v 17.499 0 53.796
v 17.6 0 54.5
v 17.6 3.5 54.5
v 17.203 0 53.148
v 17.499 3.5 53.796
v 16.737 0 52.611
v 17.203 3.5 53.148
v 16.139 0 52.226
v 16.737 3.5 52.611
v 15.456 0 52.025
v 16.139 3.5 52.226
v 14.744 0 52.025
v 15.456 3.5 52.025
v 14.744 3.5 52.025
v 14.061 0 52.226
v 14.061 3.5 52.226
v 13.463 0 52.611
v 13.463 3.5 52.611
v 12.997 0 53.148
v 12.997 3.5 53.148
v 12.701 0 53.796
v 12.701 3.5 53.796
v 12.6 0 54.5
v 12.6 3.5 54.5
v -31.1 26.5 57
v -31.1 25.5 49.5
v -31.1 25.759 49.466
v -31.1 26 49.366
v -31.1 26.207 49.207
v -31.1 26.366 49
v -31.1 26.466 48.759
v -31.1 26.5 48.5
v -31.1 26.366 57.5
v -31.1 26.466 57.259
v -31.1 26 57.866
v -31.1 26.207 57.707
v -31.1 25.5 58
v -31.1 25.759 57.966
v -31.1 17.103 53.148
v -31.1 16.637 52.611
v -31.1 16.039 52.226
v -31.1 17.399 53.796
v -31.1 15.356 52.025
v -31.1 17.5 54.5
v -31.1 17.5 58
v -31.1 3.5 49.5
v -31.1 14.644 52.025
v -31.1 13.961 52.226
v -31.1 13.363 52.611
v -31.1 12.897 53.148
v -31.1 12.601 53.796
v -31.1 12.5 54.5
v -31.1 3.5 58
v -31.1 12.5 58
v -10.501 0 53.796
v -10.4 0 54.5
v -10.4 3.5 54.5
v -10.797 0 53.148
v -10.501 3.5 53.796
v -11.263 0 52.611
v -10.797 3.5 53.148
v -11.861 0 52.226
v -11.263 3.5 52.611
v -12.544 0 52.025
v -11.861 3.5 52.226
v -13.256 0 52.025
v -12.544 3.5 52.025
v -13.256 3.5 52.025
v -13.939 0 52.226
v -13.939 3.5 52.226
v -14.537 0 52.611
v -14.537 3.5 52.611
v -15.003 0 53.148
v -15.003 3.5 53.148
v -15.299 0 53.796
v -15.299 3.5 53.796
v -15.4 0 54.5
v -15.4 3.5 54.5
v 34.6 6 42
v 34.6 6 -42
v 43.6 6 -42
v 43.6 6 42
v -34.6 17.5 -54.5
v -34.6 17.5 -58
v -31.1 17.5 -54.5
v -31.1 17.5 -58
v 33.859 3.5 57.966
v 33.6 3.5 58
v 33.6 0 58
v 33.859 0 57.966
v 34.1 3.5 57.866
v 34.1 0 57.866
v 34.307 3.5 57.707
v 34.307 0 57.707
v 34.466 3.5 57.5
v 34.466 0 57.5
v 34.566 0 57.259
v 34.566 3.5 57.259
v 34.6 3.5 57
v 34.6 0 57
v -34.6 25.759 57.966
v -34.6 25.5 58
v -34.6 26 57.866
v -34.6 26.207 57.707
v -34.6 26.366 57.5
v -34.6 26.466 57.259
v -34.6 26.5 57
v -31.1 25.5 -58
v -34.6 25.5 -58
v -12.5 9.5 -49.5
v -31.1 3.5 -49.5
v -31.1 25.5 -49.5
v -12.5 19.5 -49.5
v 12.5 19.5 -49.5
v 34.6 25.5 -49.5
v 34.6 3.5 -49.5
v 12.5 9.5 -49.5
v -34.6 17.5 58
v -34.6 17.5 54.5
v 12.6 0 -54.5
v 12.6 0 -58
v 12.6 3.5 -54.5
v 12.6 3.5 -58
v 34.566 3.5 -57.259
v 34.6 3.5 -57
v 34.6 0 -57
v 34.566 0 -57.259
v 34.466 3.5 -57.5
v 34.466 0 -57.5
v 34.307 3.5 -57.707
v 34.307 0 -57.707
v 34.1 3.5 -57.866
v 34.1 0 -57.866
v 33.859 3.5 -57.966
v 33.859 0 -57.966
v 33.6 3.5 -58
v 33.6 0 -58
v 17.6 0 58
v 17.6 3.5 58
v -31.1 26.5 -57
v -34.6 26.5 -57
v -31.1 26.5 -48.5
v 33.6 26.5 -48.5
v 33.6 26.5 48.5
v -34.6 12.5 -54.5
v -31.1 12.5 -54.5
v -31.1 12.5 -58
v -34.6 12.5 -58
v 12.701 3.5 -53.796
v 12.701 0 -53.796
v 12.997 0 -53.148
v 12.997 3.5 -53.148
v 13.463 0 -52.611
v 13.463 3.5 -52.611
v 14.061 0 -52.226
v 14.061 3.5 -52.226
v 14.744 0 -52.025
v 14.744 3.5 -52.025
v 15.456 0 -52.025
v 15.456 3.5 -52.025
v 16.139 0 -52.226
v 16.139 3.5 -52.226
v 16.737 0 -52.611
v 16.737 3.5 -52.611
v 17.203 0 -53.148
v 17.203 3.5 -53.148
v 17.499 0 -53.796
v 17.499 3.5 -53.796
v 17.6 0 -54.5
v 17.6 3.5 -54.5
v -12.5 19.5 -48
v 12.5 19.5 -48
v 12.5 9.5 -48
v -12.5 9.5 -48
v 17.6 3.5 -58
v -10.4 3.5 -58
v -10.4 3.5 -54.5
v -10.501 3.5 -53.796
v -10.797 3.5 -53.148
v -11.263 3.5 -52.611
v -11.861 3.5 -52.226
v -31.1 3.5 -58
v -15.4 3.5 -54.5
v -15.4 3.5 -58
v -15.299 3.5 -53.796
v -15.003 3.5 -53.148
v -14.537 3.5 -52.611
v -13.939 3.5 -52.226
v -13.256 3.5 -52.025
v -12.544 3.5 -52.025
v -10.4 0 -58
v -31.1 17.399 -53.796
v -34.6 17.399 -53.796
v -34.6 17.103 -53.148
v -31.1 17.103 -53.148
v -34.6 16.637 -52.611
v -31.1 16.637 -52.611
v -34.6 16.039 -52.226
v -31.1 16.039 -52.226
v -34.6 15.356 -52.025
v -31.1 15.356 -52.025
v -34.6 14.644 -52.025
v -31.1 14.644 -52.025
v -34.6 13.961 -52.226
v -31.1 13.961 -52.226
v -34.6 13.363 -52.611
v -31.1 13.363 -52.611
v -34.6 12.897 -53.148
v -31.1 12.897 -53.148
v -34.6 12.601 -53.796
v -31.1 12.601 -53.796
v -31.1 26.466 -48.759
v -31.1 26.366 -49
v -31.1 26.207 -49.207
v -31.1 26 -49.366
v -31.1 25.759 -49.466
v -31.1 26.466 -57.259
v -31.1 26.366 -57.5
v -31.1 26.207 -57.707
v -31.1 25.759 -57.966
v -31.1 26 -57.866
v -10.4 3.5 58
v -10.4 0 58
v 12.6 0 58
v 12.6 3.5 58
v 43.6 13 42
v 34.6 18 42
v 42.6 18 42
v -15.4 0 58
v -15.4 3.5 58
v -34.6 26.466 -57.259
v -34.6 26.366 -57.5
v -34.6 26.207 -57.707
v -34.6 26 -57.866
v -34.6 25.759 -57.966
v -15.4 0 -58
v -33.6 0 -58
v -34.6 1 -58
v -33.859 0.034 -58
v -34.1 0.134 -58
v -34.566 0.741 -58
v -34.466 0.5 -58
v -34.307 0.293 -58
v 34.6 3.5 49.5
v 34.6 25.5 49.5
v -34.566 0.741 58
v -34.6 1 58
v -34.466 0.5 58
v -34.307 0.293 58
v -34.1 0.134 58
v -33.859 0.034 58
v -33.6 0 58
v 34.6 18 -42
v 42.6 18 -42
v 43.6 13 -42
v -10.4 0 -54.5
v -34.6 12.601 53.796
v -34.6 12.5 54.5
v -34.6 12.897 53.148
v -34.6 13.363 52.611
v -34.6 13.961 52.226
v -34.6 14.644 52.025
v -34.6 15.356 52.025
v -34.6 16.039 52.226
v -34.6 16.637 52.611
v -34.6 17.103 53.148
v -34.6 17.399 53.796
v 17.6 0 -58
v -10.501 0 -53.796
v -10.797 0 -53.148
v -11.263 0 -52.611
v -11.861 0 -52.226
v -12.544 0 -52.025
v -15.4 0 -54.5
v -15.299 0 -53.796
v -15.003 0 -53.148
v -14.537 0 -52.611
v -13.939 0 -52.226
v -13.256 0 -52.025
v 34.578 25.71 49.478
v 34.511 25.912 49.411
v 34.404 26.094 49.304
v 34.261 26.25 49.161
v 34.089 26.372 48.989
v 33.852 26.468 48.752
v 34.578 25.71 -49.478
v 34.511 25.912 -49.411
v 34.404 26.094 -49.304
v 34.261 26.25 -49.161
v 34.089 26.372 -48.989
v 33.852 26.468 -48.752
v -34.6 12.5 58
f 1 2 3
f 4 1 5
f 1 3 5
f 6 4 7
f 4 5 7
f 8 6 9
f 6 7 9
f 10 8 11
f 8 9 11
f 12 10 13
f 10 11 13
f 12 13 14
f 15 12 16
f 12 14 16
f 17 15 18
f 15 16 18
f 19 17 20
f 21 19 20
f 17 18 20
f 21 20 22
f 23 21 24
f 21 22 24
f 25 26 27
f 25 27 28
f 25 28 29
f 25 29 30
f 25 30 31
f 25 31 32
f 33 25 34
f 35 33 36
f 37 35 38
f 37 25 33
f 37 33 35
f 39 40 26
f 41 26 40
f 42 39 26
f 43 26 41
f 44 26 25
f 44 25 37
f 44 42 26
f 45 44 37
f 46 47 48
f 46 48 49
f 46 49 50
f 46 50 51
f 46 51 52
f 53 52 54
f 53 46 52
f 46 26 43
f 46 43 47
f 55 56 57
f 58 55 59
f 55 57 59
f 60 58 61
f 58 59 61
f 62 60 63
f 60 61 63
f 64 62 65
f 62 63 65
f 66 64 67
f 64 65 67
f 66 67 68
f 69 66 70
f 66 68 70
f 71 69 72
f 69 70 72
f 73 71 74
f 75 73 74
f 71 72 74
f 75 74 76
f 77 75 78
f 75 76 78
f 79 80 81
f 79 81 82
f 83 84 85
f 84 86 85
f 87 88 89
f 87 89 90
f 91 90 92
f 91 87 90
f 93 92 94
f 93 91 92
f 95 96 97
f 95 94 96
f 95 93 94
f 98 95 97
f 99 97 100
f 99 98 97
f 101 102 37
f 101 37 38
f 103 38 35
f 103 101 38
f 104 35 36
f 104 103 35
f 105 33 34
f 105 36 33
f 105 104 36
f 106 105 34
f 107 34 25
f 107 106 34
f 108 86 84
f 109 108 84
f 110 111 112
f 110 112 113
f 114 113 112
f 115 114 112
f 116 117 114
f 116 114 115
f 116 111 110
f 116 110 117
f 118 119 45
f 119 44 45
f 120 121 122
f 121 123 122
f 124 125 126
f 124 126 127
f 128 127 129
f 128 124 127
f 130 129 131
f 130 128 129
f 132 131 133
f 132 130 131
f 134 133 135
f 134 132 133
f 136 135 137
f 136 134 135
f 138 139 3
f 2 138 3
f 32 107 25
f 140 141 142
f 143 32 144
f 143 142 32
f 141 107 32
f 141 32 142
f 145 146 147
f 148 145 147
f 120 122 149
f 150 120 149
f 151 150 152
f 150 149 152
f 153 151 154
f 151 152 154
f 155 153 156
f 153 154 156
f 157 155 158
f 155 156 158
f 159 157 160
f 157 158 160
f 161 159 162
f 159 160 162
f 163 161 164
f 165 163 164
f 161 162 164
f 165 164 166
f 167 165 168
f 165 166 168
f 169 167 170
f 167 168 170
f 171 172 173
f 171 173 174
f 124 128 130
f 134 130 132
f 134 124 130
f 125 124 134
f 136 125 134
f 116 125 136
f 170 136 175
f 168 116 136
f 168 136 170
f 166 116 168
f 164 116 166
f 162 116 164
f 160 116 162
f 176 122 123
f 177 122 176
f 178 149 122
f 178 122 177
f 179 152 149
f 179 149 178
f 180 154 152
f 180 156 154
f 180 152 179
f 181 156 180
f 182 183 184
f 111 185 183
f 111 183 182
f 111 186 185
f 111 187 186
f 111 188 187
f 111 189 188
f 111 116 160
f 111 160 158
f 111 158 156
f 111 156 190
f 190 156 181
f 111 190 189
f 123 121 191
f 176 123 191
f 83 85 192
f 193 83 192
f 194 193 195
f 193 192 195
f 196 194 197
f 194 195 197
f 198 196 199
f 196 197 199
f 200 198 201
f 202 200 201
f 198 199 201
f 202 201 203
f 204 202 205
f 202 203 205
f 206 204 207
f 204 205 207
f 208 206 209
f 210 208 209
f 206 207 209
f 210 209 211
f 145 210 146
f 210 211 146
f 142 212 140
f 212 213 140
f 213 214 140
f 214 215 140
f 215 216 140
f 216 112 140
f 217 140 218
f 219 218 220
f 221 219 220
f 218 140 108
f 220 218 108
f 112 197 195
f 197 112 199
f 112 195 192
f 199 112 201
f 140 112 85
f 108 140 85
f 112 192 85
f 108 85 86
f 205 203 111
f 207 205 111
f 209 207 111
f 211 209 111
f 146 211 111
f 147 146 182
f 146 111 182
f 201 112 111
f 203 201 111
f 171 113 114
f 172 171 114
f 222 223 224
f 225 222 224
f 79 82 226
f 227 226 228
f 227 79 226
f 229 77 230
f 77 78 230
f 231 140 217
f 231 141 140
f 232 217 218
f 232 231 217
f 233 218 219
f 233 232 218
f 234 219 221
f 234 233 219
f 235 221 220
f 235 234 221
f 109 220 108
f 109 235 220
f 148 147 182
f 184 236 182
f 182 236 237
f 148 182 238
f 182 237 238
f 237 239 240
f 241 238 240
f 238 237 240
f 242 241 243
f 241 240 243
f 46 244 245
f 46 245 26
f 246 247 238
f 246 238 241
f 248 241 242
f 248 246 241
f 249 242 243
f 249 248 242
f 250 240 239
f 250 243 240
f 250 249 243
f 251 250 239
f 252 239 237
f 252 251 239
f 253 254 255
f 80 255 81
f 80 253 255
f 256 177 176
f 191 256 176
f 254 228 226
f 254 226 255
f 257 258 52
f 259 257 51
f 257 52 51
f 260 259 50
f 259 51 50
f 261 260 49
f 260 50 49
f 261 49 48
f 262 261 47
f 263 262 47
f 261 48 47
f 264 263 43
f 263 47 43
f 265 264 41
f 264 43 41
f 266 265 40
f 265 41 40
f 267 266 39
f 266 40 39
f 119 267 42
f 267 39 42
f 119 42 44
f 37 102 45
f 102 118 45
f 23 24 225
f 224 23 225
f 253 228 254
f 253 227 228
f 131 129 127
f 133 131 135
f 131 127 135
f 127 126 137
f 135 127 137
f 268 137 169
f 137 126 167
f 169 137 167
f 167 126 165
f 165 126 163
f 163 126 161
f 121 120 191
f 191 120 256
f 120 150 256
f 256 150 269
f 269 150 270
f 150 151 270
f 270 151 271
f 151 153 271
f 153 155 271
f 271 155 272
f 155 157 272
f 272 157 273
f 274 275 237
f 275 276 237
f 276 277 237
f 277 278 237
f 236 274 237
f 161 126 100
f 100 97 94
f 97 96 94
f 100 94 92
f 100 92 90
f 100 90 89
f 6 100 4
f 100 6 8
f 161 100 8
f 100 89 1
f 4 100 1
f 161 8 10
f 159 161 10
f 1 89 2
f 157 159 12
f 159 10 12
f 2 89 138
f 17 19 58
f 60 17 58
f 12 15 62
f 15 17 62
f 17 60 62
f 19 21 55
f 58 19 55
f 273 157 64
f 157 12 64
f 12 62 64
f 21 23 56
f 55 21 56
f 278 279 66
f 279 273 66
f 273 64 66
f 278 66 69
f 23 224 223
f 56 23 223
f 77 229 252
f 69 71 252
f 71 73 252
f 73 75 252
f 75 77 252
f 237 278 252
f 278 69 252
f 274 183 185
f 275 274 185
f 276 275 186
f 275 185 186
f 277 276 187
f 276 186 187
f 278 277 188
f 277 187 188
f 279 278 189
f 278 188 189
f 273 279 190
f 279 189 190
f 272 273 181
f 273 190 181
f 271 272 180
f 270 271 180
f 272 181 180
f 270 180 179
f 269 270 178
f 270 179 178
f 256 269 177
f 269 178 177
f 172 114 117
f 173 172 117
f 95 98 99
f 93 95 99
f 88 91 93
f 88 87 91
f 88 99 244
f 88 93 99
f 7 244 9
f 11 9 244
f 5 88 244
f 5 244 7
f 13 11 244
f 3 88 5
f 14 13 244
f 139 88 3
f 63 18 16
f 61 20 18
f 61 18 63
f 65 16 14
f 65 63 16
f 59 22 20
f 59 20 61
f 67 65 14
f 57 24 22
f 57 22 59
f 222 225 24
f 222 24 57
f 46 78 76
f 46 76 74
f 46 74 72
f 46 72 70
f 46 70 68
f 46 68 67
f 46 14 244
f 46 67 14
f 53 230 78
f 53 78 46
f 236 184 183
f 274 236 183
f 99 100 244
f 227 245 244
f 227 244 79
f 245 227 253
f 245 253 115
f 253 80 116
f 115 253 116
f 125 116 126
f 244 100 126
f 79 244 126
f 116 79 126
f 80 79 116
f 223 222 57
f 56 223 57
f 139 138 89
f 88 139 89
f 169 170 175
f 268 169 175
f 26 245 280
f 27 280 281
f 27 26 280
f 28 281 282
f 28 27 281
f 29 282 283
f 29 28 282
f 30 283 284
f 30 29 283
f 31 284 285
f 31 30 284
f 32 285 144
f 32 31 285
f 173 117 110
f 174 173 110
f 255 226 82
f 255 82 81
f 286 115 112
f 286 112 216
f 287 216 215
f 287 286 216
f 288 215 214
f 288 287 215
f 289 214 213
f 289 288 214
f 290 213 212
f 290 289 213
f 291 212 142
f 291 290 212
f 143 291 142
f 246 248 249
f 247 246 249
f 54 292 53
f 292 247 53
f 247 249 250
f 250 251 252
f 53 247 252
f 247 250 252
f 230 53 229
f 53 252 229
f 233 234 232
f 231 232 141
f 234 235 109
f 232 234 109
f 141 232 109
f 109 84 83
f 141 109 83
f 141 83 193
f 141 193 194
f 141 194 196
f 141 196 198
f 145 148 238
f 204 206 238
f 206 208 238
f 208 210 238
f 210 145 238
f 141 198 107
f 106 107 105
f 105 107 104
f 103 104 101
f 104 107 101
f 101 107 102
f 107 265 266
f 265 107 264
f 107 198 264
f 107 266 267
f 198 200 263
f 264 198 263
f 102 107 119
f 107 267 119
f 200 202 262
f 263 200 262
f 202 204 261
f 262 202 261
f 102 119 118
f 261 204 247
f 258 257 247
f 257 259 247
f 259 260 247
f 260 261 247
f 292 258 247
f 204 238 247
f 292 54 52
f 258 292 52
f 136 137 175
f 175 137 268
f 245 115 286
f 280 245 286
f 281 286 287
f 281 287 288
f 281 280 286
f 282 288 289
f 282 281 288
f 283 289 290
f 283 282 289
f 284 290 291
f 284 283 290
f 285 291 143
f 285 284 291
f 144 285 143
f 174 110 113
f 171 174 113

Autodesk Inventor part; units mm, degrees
ref_plane "YZ Plane" through (0, 0, 0) normal (1, 0, 0) x (0, 1, 0)
ref_plane "XZ Plane" through (0, 0, 0) normal (0, 1, 0) x (-1, 0, 0)
ref_plane "XY Plane" through (0, 0, 0) normal (0, 0, 1) x (1, 0, 0)
sketch "Sketch1" plane through (0, 0, 0) normal (0, 1, 0) x (-1, 0, 0)
  line L0 (34.6, 58) -> (-34.6, 58)
  line L1 (-34.6, 58) -> (-34.6, -58)
  line L2 (-34.6, -58) -> (34.6, -58)
  line L3 (34.6, -58) -> (34.6, 58)
  line L4 (34.6, 58) -> (-34.6, -58) construction
  line L5 (-34.6, 58) -> (34.6, -58) construction
  point P0 (0, 0)
  dimension "d0" = 69.2
  dimension "d1" = 116
extrude "Extrusion1" add sketch "Sketch1" along normal blind 3.5
sketch "Sketch2" plane through (0, 3.5, 0) normal (0, 1, 0) x (1, 0, 0)
  line L0 (-34.6, 49.5) -> (34.6, 49.5)
  line L1 (34.6, 49.5) -> (34.6, -49.5)
  line L2 (34.6, -49.5) -> (-34.6, -49.5)
  line L3 (-34.6, -49.5) -> (-34.6, 49.5)
  line L4 (-34.6, 49.5) -> (34.6, -49.5) construction
  line L5 (34.6, 49.5) -> (-34.6, -49.5) construction
  line L6 (-34.6, 49.5) -> (-31.1, 49.5)
  line L7 (-31.1, 49.5) -> (-31.1, 58)
  line L8 (-31.1, 58) -> (-34.6, 58)
  line L9 (-34.6, 58) -> (-34.6, 49.5)
  line L10 (-34.6, -49.5) -> (-31.1, -49.5)
  line L11 (-31.1, -49.5) -> (-31.1, -58)
  line L12 (-31.1, -58) -> (-34.6, -58)
  line L13 (-34.6, -58) -> (-34.6, -49.5)
  point P0 (0, 0)
  dimension "d4" = 69.2
  dimension "d5" = 99
  dimension "d6" = 3.5
  dimension "d7" = 8.5
  dimension "d8" = 3.5
  dimension "d9" = 8.5
extrude "Extrusion2" add sketch "Sketch2" along normal blind 23
sketch "Sketch3" plane through (34.6, 0, 58) normal (1, 0, 0) x (0, 0, -1)
  line L0 (58, 0) -> (58, 55) construction
  line L1 (58, 0) -> (113, 0) construction
  line L2 (16, 18) -> (100, 18)
  line L3 (100, 18) -> (100, 6)
  line L4 (100, 6) -> (16, 6)
  line L5 (16, 6) -> (16, 18)
  line L6 (16, 18) -> (100, 6) construction
  line L7 (100, 18) -> (16, 6) construction
  point P0 (58, 12)
  dimension "d12" = 55
  dimension "d13" = 90
  dimension "d14" = 84
  dimension "d15" = 12
  dimension "d16" = 12
extrude "Extrusion3" add sketch "Sketch3" along normal blind 9
chamfer "Chamfer1" distance 5 distance2 1 1 edges at (43.6, 18, 0) measured on face at (43.6, 14, 14)
sketch "Sketch5" plane through (-31.1, 3.5, -49.5) normal (1, 0, 0) x (0, 0, -1)
  line L0 (5, 11.5) -> (10, 11.5) construction
  line L1 (5, 9) -> (10, 9)
  line L2 (10, 14) -> (5, 14)
  arc A0 (5, 14) -> (5, 9) centre (5, 11.5) ccw
  arc A1 (10, 9) -> (10, 14) centre (10, 11.5) ccw
  line L3 (5, 11.5) -> (10, 11.5) construction
  line L4 (-107.5, -3.5) -> (8.5, -3.5) projected
  line L5 (8.5, 0) -> (8.5, 23) projected
  point P0 (-49.5, -3.5)
  point P1 (7.5, 11.5)
  point P2 (8.5, 9)
  point P3 (8.5, 14)
  dimension "d38" = 5
  dimension "d39" = 0
  dimension "d40" = 5
  dimension "d41" = 15
  dimension "d42" = 3.5
extrude "Extrusion5" cut sketch "Sketch5" against normal blind 9 contours A0 L2 L5 L1
sketch "Sketch4" plane through (0, 3.5, 0) normal (0, 1, 0) x (1, 0, 0)
  circle A0 centre (15.1, 54.5) radius 2.5
  circle A1 centre (-12.9, 54.5) radius 2.5
  line L0 (34.6, 49.5) -> (34.6, 58) projected
  line L1 (34.6, 58) -> (-31.1, 58) projected
  line L2 (15.1, 54.5) -> (15.1, 58) construction
  line L3 (34.6, 58) -> (-34.6, 58) projected
  line L4 (17.6, 54.5) -> (17.6, 58)
  line L5 (12.6, 58) -> (12.6, 54.5)
  arc A2 (12.6, 54.5) -> (17.6, 54.5) centre (15.1, 54.5) ccw
  arc A3 (17.6, 58) -> (12.6, 58) centre (15.1, 58) ccw
  line L6 (15.1, 54.5) -> (18.6, 54.5) construction
  line L7 (-12.9, 54.5) -> (-12.9, 58) construction
  line L8 (-10.4, 54.5) -> (-10.4, 58)
  line L9 (-15.4, 58) -> (-15.4, 54.5)
  arc A4 (-15.4, 54.5) -> (-10.4, 54.5) centre (-12.9, 54.5) ccw
  arc A5 (-10.4, 58) -> (-15.4, 58) centre (-12.9, 58) ccw
  line L10 (-12.9, 54.5) -> (-9.4, 54.5) construction
  point P0 (0, 0)
  point P1 (15.1, 56.25)
  point P2 (-12.9, 56.25)
  point P3 (17.6, 54.5)
  dimension "d22" = 5
  dimension "d23" = 5
  dimension "d24" = 19.5
  dimension "d25" = 28
  dimension "d26" = 3.5
  dimension "d27" = 3.5
  dimension "d28" = 90
  dimension "d29" = 5
  dimension "d30" = 3.5
  dimension "d31" = 90
  dimension "d32" = 5
extrude "Extrusion4" cut sketch "Sketch4" against normal blind 9 contours A0 | L8 A1 L9 L1 | A0 L5 L1 L4 | A1
mirror "Mirror1" about plane through (0, 0, 0) normal (0, 0, 1) of "Extrusion4", "Extrusion5"
fillet "Fillet1" radius 1 8 edges at (34.6, 26.5, 0) (1.75, 26.5, 49.5) (1.75, 26.5, -49.5) (-32.85, 26.5, -58) (34.6, 1.75, -58) (34.6, 1.75, 58) (-34.6, 0, 0) (-32.85, 26.5, 58)
sketch "Sketch6" plane through (34.6, 3.5, -49.5) normal (0, 0, -1) x (-1, 0, 0)
  line L0 (34.6, -3.5) -> (34.6, 46.5) construction
  line L1 (34.6, -3.5) -> (84.6, -3.5) construction
  line L2 (47.1, 16) -> (22.1, 16)
  line L3 (22.1, 16) -> (22.1, 6)
  line L4 (22.1, 6) -> (47.1, 6)
  line L5 (47.1, 6) -> (47.1, 16)
  line L6 (47.1, 16) -> (22.1, 6) construction
  line L7 (22.1, 16) -> (47.1, 6) construction
  point P0 (34.6, 11)
  dimension "d46" = 50
  dimension "d47" = 90
  dimension "d48" = 25
  dimension "d49" = 10
  dimension "d50" = 14.5
extrude "Extrusion6" cut sketch "Sketch6" against normal blind 1.5
properties part number "CL57T_Stepper_Driver"
